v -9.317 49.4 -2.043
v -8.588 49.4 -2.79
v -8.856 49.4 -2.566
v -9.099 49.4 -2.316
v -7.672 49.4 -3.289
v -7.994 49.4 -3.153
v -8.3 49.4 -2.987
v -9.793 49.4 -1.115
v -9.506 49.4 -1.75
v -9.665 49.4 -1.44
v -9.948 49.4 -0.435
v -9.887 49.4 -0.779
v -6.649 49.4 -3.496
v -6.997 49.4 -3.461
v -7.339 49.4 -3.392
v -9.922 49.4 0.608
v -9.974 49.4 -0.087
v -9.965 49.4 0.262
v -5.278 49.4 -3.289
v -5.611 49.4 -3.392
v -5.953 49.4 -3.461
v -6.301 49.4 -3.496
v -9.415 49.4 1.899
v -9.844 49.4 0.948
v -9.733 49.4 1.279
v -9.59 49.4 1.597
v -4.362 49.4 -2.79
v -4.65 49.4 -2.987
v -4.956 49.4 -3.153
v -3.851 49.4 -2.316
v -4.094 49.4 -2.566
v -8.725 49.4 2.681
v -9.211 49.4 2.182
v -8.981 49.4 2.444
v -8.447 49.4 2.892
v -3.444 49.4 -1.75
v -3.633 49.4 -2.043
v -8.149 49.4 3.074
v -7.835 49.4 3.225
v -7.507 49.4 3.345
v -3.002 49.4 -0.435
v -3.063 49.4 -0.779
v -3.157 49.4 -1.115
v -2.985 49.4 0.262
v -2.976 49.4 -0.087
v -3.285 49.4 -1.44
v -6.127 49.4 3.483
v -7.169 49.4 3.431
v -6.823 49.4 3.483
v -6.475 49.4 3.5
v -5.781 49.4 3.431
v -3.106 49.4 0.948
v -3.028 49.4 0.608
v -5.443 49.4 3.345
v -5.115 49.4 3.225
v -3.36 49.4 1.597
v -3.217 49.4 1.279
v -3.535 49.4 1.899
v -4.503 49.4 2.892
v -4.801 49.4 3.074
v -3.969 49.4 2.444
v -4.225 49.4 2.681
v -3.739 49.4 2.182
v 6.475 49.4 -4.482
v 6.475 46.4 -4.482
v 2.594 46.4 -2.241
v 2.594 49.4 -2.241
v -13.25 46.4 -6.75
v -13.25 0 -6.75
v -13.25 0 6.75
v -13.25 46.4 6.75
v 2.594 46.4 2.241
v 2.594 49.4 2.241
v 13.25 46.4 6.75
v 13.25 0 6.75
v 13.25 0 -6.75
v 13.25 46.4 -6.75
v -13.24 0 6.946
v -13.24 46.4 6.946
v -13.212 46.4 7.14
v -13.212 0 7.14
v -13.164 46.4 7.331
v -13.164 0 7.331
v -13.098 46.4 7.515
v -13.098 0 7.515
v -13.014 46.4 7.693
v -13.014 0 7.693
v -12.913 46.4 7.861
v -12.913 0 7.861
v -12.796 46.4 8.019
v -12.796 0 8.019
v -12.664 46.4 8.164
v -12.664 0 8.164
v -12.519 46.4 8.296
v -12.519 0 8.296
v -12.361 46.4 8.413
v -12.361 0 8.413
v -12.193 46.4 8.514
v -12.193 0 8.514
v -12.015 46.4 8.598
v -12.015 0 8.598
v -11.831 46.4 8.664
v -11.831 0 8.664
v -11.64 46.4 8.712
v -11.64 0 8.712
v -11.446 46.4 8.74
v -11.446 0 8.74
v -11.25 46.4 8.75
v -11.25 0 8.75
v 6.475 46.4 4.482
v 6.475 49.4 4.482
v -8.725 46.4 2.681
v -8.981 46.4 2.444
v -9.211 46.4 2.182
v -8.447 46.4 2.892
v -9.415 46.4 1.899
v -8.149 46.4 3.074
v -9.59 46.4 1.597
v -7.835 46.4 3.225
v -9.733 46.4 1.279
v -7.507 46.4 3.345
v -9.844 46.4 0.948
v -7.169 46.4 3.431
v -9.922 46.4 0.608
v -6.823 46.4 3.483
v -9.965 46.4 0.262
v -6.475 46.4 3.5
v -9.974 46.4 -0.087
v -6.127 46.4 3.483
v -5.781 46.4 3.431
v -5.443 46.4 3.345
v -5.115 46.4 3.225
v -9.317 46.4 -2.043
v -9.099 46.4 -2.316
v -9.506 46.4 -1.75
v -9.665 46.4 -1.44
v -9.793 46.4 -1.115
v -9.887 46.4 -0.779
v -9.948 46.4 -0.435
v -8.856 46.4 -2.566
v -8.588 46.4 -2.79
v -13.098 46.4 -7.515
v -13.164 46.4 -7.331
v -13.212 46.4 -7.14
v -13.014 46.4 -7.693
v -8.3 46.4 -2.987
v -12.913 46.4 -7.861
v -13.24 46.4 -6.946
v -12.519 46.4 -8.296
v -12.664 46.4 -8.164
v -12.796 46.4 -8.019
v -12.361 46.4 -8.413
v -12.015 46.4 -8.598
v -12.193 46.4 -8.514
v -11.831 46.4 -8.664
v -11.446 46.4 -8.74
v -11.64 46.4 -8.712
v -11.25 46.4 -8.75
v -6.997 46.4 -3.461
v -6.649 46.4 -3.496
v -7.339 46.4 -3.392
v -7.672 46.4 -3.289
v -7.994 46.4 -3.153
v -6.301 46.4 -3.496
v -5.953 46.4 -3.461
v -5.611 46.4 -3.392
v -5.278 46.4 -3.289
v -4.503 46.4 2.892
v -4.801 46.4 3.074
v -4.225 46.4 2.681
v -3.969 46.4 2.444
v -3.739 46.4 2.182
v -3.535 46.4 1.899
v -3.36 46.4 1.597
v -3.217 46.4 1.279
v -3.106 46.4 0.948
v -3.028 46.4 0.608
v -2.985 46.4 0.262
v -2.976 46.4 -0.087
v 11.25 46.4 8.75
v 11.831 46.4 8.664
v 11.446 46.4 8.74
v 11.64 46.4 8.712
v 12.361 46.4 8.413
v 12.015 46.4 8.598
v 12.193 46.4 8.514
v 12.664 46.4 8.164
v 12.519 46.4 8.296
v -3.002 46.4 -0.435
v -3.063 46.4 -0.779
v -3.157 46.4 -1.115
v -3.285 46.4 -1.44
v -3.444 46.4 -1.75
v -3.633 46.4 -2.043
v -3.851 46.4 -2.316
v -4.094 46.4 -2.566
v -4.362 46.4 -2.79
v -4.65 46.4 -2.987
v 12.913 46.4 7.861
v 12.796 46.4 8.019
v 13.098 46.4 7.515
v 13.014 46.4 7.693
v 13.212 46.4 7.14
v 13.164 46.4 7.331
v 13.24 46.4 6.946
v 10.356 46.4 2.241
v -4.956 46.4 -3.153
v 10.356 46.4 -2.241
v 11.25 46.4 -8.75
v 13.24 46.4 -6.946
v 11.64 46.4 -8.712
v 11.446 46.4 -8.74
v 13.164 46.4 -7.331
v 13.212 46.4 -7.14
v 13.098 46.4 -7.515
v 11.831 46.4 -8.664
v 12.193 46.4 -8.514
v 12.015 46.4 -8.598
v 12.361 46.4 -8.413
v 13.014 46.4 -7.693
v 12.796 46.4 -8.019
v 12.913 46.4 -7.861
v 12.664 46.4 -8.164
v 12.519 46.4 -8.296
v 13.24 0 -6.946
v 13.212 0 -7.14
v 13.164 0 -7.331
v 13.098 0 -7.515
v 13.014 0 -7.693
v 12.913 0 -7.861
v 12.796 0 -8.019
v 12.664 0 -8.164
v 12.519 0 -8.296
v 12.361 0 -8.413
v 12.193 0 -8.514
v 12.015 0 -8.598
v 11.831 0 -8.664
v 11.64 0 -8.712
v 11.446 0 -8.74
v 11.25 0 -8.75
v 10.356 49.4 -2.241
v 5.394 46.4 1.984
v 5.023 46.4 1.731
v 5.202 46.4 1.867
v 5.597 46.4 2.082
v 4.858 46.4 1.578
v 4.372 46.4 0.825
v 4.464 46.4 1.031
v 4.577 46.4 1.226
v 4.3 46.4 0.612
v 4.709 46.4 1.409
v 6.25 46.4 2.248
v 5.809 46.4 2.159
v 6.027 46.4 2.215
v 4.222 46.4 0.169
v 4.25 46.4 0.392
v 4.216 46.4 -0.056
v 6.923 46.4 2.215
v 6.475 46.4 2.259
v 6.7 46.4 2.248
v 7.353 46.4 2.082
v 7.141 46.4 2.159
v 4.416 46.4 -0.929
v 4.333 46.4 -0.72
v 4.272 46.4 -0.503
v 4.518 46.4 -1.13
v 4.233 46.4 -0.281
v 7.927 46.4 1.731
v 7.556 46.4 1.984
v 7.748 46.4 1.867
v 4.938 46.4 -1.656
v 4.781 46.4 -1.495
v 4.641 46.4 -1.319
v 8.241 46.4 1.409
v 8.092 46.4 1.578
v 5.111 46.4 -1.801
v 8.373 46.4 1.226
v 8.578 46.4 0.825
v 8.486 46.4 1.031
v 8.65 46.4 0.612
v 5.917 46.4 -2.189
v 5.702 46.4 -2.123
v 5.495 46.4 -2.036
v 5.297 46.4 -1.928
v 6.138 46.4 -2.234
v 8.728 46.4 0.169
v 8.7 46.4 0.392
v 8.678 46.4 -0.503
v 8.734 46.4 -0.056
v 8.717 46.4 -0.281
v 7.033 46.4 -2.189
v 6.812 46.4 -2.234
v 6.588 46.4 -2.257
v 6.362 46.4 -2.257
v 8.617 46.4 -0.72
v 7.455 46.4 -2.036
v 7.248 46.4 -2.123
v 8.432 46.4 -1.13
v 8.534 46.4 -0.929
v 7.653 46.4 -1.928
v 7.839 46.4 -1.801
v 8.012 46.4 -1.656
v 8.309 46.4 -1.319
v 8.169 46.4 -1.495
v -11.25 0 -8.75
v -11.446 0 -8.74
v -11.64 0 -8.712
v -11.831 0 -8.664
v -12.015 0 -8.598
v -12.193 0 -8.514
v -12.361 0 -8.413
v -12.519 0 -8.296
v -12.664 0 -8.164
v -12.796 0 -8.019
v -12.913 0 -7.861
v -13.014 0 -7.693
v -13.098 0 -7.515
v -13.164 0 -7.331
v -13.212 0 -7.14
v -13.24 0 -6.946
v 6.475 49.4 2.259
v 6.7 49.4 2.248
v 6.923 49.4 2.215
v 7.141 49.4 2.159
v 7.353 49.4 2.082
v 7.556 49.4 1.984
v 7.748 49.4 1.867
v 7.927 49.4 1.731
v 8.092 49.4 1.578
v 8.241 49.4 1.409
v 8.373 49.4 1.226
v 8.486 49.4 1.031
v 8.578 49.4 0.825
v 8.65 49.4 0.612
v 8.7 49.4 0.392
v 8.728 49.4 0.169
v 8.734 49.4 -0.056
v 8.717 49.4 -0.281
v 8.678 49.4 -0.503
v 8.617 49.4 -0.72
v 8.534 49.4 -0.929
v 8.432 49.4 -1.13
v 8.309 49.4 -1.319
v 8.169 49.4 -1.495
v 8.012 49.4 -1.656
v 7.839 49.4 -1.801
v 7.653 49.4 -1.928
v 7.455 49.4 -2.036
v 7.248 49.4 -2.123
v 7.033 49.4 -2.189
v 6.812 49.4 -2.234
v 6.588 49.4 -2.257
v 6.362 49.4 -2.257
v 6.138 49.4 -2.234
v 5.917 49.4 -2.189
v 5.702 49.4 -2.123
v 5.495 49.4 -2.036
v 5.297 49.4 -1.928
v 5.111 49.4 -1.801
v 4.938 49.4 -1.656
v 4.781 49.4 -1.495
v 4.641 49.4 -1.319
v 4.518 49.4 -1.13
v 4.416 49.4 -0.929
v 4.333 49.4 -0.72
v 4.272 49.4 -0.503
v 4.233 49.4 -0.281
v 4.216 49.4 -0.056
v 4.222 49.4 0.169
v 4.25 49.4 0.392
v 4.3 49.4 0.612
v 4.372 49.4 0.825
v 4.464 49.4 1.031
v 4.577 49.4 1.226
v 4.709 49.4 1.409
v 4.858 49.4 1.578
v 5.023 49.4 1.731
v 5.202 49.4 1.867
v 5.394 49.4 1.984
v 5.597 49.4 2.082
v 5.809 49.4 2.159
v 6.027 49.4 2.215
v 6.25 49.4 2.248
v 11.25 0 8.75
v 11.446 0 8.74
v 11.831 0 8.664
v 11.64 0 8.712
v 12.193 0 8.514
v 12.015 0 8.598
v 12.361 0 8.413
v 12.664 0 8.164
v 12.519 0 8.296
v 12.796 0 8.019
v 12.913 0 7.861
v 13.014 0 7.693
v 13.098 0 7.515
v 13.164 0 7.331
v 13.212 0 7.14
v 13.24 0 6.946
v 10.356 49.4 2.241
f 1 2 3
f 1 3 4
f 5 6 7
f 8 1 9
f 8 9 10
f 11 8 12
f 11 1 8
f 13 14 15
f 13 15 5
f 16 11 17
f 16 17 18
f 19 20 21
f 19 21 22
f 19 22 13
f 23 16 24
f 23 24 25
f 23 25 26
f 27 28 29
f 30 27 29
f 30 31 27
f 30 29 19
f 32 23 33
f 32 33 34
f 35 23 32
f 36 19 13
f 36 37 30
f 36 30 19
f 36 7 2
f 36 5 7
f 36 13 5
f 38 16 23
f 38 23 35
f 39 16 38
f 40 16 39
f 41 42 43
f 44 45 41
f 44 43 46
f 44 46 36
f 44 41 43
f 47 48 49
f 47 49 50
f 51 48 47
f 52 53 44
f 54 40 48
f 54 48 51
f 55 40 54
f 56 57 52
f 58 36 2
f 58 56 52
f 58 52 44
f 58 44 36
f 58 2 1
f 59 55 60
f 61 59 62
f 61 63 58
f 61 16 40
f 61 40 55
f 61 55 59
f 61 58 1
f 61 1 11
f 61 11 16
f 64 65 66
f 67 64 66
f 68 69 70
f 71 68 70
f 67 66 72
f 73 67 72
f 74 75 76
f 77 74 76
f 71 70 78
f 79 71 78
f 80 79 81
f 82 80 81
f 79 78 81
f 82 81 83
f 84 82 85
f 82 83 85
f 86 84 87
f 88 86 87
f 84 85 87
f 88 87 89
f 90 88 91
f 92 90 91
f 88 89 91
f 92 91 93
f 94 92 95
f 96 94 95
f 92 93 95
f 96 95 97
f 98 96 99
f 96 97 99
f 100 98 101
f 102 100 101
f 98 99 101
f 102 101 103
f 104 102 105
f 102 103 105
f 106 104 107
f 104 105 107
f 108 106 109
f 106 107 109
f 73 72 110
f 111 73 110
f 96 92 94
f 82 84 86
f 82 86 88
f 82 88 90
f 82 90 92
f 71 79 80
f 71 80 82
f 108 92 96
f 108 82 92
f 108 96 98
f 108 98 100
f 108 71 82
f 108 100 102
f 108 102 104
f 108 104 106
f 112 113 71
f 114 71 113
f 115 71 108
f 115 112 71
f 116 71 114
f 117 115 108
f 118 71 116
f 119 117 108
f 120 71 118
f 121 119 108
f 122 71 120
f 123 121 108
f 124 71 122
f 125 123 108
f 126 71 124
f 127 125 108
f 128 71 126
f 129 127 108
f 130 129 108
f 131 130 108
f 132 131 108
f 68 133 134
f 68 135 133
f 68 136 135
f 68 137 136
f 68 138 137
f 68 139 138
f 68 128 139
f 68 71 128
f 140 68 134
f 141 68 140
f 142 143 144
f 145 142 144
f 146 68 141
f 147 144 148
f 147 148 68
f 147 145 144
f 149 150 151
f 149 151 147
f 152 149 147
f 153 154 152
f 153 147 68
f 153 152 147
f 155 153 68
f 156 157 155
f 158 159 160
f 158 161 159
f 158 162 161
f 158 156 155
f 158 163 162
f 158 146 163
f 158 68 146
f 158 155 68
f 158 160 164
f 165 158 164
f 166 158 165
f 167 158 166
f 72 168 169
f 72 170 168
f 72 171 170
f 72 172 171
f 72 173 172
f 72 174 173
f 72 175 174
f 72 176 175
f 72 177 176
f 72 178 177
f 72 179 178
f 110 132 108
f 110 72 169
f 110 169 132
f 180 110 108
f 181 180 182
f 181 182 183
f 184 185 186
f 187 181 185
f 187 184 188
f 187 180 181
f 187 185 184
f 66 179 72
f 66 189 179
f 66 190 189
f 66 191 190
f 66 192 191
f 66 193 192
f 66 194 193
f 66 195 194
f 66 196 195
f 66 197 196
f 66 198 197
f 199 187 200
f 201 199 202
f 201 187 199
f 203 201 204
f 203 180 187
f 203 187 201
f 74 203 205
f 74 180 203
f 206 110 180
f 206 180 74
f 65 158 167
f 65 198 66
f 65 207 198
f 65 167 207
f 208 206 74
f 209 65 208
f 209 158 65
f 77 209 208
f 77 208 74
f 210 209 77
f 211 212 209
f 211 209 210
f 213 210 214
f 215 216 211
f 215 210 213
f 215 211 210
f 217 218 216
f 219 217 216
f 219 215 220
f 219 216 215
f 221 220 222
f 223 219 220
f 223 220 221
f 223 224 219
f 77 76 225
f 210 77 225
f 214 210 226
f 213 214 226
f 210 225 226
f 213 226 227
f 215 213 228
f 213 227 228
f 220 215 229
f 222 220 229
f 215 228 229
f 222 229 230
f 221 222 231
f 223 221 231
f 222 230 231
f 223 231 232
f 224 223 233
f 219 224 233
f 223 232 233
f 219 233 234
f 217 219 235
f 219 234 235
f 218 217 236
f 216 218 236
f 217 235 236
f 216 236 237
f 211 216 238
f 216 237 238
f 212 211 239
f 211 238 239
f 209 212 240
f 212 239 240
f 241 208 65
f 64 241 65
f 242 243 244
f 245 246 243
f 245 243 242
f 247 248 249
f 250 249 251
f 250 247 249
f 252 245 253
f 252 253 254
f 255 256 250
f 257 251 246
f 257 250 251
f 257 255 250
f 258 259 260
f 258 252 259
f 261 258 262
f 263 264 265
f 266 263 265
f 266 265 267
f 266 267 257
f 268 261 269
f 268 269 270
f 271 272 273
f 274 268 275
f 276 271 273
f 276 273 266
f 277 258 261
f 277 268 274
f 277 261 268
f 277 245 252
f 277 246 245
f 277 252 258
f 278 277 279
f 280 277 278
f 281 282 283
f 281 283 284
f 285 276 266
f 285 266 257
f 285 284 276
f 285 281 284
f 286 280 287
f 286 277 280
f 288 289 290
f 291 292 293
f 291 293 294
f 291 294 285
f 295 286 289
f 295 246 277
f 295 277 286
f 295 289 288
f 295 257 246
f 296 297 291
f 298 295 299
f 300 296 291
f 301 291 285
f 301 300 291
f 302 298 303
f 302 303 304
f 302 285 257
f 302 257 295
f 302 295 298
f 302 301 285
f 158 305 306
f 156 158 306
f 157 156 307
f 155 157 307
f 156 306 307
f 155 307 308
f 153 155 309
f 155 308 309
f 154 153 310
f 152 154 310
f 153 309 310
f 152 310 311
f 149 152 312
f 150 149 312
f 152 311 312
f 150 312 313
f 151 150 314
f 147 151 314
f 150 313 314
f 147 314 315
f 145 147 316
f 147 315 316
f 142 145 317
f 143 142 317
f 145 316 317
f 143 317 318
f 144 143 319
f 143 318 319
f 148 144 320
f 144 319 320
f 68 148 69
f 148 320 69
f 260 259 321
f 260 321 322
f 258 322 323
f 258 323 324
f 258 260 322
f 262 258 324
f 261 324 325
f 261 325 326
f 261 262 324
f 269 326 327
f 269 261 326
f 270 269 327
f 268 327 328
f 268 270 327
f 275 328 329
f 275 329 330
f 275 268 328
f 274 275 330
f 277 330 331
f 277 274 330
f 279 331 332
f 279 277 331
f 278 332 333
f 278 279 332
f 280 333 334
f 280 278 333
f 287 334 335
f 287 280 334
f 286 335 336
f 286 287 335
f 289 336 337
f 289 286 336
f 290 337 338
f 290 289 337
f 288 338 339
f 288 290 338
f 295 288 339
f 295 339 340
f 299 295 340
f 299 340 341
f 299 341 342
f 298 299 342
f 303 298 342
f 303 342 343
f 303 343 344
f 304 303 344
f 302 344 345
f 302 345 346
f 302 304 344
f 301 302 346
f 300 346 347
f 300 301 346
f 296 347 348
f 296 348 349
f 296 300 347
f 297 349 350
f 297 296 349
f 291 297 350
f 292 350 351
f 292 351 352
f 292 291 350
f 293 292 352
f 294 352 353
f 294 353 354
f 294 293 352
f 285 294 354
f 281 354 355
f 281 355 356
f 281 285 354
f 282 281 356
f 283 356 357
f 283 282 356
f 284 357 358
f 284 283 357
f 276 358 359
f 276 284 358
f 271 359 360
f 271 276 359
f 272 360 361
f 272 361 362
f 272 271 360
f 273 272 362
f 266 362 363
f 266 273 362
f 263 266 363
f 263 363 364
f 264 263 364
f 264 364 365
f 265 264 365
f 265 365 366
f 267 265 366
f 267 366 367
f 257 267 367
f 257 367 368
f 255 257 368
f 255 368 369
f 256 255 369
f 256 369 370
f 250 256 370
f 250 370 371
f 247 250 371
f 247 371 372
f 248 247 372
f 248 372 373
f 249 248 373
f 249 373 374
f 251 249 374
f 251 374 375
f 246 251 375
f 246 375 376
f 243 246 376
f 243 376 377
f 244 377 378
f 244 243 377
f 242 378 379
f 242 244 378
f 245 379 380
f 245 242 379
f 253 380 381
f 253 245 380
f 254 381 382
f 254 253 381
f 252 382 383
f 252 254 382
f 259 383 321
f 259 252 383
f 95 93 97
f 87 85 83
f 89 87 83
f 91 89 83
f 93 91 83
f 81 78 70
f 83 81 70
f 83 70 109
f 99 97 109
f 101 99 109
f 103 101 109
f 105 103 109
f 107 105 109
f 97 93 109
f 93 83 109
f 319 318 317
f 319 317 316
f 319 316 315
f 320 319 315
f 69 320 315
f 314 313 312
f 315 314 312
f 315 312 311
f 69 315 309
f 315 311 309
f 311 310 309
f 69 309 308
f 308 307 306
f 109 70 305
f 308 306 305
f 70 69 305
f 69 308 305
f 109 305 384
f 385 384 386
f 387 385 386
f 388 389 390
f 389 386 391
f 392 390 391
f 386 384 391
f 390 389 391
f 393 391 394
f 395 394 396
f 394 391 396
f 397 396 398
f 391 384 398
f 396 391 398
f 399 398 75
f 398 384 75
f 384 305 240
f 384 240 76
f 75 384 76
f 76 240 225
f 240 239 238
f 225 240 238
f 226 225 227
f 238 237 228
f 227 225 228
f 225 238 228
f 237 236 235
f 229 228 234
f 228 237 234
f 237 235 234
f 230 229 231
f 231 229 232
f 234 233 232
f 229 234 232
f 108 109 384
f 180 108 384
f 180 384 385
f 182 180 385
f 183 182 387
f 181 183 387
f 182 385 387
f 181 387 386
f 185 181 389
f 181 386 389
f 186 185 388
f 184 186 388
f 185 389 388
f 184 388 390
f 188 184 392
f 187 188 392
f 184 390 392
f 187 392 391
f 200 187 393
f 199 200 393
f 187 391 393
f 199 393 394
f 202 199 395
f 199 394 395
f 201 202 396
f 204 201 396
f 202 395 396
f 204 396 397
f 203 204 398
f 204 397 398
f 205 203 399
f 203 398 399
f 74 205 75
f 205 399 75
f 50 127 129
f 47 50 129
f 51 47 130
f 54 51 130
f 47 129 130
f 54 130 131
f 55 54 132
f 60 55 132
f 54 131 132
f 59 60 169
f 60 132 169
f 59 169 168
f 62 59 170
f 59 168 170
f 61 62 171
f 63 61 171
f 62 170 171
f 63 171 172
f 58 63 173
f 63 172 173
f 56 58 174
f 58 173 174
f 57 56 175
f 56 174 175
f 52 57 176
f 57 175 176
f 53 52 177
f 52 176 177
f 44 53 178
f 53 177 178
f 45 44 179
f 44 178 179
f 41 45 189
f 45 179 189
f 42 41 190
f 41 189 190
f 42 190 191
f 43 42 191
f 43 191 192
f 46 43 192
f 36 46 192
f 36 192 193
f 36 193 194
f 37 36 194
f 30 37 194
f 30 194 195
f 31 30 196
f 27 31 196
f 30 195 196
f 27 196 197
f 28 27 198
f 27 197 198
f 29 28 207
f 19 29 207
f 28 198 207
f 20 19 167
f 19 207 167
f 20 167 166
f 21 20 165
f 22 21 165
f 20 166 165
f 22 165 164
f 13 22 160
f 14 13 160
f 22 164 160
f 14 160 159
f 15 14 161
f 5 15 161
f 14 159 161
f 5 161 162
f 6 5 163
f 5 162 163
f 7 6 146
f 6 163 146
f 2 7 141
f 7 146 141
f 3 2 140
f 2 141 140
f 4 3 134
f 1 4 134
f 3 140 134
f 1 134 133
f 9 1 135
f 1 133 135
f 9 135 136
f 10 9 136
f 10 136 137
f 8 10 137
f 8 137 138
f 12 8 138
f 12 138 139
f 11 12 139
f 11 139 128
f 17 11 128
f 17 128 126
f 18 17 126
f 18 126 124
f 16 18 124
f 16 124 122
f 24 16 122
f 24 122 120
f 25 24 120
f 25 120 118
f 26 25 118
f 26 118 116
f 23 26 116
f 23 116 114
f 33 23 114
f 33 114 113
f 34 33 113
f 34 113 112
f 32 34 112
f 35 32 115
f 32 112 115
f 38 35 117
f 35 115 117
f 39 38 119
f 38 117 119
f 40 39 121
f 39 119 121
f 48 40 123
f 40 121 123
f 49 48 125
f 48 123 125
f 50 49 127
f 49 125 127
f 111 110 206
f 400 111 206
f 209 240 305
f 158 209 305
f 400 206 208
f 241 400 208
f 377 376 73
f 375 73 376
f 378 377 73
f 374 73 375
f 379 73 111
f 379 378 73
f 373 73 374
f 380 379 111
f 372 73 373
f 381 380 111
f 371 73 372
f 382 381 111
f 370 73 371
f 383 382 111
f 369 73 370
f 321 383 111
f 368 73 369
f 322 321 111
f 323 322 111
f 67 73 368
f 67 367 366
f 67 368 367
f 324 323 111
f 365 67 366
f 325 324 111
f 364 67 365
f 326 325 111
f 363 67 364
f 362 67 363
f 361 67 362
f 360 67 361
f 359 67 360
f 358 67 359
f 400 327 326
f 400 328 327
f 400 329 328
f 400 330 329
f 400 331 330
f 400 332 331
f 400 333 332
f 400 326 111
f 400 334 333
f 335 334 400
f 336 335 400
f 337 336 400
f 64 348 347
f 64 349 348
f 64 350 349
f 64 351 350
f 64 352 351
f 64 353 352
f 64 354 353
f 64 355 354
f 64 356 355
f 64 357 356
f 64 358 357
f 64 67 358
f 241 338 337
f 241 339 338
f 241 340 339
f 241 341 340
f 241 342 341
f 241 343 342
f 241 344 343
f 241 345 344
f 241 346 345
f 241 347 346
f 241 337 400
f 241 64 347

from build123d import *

# Parameters (mm, degrees)
BOSS_EXTRUDE1_DEPTH = 46.4
SKETCH2_R           = 3.5
SKETCH2_R_2         = 2.259315118
BOSS_EXTRUDE2_DEPTH = 3


with BuildPart() as part:
    # Sketch1 → Boss-Extrude1 (new body)
    with BuildSketch(Plane(origin=(0, 0, 0), x_dir=(1, 0, 0), z_dir=(0, 1, 0))):
        with BuildLine():
            Line((-11.25, -8.75), (11.25, -8.75))
            ThreePointArc((11.25, -8.75), (12.664213562, -8.164213562), (13.25, -6.75))
            Line((13.25, -6.75), (13.25, 6.75))
            ThreePointArc((13.25, 6.75), (12.664213562, 8.164213562), (11.25, 8.75))
            Line((11.25, 8.75), (-11.25, 8.75))
            ThreePointArc((-11.25, 8.75), (-12.664213562, 8.164213562), (-13.25, 6.75))
            Line((-13.25, 6.75), (-13.25, -6.75))
            ThreePointArc((-13.25, -6.75), (-12.664213562, -8.164213562), (-11.25, -8.75))
        make_face()
    extrude(amount=BOSS_EXTRUDE1_DEPTH)

    # Sketch2 → Boss-Extrude2 (add)
    # profile 1 of 2: a face of its own
    with BuildSketch(Plane(origin=(0, 46.4, 0), x_dir=(1, 0, 0), z_dir=(0, 1, 0))):
        with Locations(Location((-6.475, 0, 0), (0, 0, 270))):
            Circle(SKETCH2_R)
    # profile 2 of 2: a face of its own
    with BuildSketch(Plane(origin=(0, 46.4, 0), x_dir=(1, 0, 0), z_dir=(0, 1, 0))):
        Polygon((6.475, 4.48194599), (2.593520914, 2.240972995), (2.593520914, -2.240972995), (6.475, -4.48194599), (10.356479086, -2.240972995), (10.356479086, 2.240972995), align=None)
        with Locations(Location((6.475, 0, 0), (0, 0, 270))):
            Circle(SKETCH2_R_2, mode=Mode.SUBTRACT)
    extrude(amount=BOSS_EXTRUDE2_DEPTH)


solid = part.part
